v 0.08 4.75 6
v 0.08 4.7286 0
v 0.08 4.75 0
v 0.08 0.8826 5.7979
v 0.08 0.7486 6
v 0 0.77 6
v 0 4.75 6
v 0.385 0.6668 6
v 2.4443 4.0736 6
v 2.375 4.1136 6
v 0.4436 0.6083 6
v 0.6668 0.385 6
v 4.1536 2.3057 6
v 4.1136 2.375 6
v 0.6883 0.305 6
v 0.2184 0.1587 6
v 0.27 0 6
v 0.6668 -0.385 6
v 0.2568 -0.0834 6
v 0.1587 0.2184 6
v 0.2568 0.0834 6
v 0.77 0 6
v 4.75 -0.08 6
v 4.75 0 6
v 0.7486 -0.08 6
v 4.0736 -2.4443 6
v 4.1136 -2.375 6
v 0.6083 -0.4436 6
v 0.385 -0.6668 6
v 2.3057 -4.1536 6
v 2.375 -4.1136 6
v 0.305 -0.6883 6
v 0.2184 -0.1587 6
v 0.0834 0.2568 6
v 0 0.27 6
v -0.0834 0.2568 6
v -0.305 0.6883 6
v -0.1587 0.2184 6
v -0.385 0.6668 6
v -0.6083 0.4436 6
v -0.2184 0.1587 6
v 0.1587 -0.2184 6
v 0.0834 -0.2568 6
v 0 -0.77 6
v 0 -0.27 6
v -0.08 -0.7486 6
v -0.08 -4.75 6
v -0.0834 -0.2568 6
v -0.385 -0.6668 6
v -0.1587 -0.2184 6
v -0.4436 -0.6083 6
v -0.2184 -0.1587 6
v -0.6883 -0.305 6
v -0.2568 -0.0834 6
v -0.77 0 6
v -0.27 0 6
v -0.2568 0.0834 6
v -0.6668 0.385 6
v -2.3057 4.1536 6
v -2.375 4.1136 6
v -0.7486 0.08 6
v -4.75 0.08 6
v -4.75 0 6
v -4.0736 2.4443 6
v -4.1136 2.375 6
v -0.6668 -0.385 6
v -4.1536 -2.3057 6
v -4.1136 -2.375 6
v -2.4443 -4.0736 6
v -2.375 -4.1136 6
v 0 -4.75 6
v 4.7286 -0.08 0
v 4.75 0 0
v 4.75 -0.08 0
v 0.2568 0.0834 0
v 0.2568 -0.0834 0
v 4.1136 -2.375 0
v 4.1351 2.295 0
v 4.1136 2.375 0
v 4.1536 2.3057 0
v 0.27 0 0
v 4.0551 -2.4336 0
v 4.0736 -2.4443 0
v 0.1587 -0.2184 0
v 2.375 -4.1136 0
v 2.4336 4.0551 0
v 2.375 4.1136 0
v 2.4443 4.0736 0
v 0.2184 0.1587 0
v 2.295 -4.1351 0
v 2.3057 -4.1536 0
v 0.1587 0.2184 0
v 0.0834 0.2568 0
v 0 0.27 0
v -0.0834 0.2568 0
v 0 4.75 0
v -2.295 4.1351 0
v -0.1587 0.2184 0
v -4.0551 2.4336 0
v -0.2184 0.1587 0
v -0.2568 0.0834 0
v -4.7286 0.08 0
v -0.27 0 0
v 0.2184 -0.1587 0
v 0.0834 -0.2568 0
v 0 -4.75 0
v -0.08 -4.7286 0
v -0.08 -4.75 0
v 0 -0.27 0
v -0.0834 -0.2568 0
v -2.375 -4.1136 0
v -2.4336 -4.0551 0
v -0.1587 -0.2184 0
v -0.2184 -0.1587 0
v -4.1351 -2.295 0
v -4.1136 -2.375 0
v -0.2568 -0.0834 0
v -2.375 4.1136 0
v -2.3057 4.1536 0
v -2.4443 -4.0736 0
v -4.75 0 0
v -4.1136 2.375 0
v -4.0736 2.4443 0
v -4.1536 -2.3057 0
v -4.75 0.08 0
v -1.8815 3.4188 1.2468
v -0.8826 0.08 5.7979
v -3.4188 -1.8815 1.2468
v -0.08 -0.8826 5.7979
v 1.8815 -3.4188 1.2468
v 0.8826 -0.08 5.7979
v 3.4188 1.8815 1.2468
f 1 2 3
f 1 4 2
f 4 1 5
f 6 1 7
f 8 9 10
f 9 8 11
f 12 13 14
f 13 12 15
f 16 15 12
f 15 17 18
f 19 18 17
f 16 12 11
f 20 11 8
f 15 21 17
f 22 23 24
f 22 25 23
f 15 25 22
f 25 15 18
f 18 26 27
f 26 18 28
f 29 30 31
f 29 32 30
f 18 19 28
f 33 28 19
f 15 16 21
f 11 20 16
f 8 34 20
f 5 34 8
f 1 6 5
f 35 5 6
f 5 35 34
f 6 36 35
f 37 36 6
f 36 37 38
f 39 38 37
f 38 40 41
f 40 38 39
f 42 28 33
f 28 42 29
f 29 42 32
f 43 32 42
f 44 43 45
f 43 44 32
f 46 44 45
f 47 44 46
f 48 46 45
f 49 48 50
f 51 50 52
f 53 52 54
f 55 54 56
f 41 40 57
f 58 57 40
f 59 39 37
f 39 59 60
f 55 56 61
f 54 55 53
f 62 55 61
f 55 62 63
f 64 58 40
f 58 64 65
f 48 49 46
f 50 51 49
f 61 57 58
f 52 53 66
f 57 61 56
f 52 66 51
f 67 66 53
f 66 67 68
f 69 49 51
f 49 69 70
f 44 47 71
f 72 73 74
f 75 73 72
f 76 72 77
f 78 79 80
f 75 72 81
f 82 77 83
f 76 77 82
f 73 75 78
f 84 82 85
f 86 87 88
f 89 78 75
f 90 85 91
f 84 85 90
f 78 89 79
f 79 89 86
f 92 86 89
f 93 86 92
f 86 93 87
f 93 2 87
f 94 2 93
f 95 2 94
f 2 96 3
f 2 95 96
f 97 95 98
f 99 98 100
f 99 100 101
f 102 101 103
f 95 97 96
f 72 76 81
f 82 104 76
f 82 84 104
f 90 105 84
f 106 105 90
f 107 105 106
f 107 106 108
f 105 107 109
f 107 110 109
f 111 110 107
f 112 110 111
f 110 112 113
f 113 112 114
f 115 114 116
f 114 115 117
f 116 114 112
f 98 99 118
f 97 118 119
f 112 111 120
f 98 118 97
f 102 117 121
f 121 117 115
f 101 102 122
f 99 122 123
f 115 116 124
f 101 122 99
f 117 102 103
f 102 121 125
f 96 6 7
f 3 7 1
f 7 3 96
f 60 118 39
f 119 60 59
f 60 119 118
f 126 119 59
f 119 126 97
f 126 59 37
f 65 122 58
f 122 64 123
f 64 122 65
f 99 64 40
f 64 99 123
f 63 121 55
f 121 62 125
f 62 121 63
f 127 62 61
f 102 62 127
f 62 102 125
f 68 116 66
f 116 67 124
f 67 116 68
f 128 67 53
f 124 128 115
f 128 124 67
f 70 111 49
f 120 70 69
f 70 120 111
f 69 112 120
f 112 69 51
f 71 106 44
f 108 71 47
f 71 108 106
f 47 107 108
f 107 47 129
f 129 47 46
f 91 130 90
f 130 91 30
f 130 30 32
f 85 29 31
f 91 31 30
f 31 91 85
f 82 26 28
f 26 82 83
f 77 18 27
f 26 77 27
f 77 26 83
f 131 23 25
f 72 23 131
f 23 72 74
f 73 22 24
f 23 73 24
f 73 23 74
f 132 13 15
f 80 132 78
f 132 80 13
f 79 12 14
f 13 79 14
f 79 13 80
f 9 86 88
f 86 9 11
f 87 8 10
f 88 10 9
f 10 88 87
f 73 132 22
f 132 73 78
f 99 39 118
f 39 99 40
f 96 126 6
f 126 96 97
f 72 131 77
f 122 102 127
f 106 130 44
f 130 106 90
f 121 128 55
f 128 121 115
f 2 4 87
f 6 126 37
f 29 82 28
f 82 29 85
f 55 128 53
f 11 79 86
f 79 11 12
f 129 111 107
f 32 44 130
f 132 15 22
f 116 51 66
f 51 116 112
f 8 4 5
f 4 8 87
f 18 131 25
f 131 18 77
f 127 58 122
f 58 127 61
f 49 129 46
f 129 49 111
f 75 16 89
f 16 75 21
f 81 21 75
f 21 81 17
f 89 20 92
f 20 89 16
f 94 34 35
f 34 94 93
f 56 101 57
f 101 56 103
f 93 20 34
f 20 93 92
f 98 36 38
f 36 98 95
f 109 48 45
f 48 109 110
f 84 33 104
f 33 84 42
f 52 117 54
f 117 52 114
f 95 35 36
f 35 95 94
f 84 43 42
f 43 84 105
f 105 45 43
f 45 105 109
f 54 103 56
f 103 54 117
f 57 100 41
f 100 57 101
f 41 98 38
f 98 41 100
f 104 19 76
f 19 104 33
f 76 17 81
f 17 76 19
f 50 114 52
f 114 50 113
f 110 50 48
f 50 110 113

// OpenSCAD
// units are in centimeters unless otherwise stated
axle_diameter = 0.54;
base_diameter = 9.5;
top_diameter  = axle_diameter + 1;
height        = 6;
nozzle_diameter = 0.04; //0.4mm in centimeters

servings_per_day = 4;
num_days_capacity = 3;
num_sections = servings_per_day * num_days_capacity;

translate([0,0,height/2]){
    difference(){
        union(){
            cylinder(height, d1=base_diameter, d2=top_diameter, center=true, $fn=num_sections);
            
            // Fins
            translate([0,0,-height/2]){
                for ( i = [0:num_sections]){
                    rotate(a=[0,0,i*360/num_sections]){
                        cube([nozzle_diameter*2,base_diameter/2,height]);
                    }
                }
            }   
        }
        cylinder(height, d=axle_diameter, center=true, $fn=20);
    }
    
}
